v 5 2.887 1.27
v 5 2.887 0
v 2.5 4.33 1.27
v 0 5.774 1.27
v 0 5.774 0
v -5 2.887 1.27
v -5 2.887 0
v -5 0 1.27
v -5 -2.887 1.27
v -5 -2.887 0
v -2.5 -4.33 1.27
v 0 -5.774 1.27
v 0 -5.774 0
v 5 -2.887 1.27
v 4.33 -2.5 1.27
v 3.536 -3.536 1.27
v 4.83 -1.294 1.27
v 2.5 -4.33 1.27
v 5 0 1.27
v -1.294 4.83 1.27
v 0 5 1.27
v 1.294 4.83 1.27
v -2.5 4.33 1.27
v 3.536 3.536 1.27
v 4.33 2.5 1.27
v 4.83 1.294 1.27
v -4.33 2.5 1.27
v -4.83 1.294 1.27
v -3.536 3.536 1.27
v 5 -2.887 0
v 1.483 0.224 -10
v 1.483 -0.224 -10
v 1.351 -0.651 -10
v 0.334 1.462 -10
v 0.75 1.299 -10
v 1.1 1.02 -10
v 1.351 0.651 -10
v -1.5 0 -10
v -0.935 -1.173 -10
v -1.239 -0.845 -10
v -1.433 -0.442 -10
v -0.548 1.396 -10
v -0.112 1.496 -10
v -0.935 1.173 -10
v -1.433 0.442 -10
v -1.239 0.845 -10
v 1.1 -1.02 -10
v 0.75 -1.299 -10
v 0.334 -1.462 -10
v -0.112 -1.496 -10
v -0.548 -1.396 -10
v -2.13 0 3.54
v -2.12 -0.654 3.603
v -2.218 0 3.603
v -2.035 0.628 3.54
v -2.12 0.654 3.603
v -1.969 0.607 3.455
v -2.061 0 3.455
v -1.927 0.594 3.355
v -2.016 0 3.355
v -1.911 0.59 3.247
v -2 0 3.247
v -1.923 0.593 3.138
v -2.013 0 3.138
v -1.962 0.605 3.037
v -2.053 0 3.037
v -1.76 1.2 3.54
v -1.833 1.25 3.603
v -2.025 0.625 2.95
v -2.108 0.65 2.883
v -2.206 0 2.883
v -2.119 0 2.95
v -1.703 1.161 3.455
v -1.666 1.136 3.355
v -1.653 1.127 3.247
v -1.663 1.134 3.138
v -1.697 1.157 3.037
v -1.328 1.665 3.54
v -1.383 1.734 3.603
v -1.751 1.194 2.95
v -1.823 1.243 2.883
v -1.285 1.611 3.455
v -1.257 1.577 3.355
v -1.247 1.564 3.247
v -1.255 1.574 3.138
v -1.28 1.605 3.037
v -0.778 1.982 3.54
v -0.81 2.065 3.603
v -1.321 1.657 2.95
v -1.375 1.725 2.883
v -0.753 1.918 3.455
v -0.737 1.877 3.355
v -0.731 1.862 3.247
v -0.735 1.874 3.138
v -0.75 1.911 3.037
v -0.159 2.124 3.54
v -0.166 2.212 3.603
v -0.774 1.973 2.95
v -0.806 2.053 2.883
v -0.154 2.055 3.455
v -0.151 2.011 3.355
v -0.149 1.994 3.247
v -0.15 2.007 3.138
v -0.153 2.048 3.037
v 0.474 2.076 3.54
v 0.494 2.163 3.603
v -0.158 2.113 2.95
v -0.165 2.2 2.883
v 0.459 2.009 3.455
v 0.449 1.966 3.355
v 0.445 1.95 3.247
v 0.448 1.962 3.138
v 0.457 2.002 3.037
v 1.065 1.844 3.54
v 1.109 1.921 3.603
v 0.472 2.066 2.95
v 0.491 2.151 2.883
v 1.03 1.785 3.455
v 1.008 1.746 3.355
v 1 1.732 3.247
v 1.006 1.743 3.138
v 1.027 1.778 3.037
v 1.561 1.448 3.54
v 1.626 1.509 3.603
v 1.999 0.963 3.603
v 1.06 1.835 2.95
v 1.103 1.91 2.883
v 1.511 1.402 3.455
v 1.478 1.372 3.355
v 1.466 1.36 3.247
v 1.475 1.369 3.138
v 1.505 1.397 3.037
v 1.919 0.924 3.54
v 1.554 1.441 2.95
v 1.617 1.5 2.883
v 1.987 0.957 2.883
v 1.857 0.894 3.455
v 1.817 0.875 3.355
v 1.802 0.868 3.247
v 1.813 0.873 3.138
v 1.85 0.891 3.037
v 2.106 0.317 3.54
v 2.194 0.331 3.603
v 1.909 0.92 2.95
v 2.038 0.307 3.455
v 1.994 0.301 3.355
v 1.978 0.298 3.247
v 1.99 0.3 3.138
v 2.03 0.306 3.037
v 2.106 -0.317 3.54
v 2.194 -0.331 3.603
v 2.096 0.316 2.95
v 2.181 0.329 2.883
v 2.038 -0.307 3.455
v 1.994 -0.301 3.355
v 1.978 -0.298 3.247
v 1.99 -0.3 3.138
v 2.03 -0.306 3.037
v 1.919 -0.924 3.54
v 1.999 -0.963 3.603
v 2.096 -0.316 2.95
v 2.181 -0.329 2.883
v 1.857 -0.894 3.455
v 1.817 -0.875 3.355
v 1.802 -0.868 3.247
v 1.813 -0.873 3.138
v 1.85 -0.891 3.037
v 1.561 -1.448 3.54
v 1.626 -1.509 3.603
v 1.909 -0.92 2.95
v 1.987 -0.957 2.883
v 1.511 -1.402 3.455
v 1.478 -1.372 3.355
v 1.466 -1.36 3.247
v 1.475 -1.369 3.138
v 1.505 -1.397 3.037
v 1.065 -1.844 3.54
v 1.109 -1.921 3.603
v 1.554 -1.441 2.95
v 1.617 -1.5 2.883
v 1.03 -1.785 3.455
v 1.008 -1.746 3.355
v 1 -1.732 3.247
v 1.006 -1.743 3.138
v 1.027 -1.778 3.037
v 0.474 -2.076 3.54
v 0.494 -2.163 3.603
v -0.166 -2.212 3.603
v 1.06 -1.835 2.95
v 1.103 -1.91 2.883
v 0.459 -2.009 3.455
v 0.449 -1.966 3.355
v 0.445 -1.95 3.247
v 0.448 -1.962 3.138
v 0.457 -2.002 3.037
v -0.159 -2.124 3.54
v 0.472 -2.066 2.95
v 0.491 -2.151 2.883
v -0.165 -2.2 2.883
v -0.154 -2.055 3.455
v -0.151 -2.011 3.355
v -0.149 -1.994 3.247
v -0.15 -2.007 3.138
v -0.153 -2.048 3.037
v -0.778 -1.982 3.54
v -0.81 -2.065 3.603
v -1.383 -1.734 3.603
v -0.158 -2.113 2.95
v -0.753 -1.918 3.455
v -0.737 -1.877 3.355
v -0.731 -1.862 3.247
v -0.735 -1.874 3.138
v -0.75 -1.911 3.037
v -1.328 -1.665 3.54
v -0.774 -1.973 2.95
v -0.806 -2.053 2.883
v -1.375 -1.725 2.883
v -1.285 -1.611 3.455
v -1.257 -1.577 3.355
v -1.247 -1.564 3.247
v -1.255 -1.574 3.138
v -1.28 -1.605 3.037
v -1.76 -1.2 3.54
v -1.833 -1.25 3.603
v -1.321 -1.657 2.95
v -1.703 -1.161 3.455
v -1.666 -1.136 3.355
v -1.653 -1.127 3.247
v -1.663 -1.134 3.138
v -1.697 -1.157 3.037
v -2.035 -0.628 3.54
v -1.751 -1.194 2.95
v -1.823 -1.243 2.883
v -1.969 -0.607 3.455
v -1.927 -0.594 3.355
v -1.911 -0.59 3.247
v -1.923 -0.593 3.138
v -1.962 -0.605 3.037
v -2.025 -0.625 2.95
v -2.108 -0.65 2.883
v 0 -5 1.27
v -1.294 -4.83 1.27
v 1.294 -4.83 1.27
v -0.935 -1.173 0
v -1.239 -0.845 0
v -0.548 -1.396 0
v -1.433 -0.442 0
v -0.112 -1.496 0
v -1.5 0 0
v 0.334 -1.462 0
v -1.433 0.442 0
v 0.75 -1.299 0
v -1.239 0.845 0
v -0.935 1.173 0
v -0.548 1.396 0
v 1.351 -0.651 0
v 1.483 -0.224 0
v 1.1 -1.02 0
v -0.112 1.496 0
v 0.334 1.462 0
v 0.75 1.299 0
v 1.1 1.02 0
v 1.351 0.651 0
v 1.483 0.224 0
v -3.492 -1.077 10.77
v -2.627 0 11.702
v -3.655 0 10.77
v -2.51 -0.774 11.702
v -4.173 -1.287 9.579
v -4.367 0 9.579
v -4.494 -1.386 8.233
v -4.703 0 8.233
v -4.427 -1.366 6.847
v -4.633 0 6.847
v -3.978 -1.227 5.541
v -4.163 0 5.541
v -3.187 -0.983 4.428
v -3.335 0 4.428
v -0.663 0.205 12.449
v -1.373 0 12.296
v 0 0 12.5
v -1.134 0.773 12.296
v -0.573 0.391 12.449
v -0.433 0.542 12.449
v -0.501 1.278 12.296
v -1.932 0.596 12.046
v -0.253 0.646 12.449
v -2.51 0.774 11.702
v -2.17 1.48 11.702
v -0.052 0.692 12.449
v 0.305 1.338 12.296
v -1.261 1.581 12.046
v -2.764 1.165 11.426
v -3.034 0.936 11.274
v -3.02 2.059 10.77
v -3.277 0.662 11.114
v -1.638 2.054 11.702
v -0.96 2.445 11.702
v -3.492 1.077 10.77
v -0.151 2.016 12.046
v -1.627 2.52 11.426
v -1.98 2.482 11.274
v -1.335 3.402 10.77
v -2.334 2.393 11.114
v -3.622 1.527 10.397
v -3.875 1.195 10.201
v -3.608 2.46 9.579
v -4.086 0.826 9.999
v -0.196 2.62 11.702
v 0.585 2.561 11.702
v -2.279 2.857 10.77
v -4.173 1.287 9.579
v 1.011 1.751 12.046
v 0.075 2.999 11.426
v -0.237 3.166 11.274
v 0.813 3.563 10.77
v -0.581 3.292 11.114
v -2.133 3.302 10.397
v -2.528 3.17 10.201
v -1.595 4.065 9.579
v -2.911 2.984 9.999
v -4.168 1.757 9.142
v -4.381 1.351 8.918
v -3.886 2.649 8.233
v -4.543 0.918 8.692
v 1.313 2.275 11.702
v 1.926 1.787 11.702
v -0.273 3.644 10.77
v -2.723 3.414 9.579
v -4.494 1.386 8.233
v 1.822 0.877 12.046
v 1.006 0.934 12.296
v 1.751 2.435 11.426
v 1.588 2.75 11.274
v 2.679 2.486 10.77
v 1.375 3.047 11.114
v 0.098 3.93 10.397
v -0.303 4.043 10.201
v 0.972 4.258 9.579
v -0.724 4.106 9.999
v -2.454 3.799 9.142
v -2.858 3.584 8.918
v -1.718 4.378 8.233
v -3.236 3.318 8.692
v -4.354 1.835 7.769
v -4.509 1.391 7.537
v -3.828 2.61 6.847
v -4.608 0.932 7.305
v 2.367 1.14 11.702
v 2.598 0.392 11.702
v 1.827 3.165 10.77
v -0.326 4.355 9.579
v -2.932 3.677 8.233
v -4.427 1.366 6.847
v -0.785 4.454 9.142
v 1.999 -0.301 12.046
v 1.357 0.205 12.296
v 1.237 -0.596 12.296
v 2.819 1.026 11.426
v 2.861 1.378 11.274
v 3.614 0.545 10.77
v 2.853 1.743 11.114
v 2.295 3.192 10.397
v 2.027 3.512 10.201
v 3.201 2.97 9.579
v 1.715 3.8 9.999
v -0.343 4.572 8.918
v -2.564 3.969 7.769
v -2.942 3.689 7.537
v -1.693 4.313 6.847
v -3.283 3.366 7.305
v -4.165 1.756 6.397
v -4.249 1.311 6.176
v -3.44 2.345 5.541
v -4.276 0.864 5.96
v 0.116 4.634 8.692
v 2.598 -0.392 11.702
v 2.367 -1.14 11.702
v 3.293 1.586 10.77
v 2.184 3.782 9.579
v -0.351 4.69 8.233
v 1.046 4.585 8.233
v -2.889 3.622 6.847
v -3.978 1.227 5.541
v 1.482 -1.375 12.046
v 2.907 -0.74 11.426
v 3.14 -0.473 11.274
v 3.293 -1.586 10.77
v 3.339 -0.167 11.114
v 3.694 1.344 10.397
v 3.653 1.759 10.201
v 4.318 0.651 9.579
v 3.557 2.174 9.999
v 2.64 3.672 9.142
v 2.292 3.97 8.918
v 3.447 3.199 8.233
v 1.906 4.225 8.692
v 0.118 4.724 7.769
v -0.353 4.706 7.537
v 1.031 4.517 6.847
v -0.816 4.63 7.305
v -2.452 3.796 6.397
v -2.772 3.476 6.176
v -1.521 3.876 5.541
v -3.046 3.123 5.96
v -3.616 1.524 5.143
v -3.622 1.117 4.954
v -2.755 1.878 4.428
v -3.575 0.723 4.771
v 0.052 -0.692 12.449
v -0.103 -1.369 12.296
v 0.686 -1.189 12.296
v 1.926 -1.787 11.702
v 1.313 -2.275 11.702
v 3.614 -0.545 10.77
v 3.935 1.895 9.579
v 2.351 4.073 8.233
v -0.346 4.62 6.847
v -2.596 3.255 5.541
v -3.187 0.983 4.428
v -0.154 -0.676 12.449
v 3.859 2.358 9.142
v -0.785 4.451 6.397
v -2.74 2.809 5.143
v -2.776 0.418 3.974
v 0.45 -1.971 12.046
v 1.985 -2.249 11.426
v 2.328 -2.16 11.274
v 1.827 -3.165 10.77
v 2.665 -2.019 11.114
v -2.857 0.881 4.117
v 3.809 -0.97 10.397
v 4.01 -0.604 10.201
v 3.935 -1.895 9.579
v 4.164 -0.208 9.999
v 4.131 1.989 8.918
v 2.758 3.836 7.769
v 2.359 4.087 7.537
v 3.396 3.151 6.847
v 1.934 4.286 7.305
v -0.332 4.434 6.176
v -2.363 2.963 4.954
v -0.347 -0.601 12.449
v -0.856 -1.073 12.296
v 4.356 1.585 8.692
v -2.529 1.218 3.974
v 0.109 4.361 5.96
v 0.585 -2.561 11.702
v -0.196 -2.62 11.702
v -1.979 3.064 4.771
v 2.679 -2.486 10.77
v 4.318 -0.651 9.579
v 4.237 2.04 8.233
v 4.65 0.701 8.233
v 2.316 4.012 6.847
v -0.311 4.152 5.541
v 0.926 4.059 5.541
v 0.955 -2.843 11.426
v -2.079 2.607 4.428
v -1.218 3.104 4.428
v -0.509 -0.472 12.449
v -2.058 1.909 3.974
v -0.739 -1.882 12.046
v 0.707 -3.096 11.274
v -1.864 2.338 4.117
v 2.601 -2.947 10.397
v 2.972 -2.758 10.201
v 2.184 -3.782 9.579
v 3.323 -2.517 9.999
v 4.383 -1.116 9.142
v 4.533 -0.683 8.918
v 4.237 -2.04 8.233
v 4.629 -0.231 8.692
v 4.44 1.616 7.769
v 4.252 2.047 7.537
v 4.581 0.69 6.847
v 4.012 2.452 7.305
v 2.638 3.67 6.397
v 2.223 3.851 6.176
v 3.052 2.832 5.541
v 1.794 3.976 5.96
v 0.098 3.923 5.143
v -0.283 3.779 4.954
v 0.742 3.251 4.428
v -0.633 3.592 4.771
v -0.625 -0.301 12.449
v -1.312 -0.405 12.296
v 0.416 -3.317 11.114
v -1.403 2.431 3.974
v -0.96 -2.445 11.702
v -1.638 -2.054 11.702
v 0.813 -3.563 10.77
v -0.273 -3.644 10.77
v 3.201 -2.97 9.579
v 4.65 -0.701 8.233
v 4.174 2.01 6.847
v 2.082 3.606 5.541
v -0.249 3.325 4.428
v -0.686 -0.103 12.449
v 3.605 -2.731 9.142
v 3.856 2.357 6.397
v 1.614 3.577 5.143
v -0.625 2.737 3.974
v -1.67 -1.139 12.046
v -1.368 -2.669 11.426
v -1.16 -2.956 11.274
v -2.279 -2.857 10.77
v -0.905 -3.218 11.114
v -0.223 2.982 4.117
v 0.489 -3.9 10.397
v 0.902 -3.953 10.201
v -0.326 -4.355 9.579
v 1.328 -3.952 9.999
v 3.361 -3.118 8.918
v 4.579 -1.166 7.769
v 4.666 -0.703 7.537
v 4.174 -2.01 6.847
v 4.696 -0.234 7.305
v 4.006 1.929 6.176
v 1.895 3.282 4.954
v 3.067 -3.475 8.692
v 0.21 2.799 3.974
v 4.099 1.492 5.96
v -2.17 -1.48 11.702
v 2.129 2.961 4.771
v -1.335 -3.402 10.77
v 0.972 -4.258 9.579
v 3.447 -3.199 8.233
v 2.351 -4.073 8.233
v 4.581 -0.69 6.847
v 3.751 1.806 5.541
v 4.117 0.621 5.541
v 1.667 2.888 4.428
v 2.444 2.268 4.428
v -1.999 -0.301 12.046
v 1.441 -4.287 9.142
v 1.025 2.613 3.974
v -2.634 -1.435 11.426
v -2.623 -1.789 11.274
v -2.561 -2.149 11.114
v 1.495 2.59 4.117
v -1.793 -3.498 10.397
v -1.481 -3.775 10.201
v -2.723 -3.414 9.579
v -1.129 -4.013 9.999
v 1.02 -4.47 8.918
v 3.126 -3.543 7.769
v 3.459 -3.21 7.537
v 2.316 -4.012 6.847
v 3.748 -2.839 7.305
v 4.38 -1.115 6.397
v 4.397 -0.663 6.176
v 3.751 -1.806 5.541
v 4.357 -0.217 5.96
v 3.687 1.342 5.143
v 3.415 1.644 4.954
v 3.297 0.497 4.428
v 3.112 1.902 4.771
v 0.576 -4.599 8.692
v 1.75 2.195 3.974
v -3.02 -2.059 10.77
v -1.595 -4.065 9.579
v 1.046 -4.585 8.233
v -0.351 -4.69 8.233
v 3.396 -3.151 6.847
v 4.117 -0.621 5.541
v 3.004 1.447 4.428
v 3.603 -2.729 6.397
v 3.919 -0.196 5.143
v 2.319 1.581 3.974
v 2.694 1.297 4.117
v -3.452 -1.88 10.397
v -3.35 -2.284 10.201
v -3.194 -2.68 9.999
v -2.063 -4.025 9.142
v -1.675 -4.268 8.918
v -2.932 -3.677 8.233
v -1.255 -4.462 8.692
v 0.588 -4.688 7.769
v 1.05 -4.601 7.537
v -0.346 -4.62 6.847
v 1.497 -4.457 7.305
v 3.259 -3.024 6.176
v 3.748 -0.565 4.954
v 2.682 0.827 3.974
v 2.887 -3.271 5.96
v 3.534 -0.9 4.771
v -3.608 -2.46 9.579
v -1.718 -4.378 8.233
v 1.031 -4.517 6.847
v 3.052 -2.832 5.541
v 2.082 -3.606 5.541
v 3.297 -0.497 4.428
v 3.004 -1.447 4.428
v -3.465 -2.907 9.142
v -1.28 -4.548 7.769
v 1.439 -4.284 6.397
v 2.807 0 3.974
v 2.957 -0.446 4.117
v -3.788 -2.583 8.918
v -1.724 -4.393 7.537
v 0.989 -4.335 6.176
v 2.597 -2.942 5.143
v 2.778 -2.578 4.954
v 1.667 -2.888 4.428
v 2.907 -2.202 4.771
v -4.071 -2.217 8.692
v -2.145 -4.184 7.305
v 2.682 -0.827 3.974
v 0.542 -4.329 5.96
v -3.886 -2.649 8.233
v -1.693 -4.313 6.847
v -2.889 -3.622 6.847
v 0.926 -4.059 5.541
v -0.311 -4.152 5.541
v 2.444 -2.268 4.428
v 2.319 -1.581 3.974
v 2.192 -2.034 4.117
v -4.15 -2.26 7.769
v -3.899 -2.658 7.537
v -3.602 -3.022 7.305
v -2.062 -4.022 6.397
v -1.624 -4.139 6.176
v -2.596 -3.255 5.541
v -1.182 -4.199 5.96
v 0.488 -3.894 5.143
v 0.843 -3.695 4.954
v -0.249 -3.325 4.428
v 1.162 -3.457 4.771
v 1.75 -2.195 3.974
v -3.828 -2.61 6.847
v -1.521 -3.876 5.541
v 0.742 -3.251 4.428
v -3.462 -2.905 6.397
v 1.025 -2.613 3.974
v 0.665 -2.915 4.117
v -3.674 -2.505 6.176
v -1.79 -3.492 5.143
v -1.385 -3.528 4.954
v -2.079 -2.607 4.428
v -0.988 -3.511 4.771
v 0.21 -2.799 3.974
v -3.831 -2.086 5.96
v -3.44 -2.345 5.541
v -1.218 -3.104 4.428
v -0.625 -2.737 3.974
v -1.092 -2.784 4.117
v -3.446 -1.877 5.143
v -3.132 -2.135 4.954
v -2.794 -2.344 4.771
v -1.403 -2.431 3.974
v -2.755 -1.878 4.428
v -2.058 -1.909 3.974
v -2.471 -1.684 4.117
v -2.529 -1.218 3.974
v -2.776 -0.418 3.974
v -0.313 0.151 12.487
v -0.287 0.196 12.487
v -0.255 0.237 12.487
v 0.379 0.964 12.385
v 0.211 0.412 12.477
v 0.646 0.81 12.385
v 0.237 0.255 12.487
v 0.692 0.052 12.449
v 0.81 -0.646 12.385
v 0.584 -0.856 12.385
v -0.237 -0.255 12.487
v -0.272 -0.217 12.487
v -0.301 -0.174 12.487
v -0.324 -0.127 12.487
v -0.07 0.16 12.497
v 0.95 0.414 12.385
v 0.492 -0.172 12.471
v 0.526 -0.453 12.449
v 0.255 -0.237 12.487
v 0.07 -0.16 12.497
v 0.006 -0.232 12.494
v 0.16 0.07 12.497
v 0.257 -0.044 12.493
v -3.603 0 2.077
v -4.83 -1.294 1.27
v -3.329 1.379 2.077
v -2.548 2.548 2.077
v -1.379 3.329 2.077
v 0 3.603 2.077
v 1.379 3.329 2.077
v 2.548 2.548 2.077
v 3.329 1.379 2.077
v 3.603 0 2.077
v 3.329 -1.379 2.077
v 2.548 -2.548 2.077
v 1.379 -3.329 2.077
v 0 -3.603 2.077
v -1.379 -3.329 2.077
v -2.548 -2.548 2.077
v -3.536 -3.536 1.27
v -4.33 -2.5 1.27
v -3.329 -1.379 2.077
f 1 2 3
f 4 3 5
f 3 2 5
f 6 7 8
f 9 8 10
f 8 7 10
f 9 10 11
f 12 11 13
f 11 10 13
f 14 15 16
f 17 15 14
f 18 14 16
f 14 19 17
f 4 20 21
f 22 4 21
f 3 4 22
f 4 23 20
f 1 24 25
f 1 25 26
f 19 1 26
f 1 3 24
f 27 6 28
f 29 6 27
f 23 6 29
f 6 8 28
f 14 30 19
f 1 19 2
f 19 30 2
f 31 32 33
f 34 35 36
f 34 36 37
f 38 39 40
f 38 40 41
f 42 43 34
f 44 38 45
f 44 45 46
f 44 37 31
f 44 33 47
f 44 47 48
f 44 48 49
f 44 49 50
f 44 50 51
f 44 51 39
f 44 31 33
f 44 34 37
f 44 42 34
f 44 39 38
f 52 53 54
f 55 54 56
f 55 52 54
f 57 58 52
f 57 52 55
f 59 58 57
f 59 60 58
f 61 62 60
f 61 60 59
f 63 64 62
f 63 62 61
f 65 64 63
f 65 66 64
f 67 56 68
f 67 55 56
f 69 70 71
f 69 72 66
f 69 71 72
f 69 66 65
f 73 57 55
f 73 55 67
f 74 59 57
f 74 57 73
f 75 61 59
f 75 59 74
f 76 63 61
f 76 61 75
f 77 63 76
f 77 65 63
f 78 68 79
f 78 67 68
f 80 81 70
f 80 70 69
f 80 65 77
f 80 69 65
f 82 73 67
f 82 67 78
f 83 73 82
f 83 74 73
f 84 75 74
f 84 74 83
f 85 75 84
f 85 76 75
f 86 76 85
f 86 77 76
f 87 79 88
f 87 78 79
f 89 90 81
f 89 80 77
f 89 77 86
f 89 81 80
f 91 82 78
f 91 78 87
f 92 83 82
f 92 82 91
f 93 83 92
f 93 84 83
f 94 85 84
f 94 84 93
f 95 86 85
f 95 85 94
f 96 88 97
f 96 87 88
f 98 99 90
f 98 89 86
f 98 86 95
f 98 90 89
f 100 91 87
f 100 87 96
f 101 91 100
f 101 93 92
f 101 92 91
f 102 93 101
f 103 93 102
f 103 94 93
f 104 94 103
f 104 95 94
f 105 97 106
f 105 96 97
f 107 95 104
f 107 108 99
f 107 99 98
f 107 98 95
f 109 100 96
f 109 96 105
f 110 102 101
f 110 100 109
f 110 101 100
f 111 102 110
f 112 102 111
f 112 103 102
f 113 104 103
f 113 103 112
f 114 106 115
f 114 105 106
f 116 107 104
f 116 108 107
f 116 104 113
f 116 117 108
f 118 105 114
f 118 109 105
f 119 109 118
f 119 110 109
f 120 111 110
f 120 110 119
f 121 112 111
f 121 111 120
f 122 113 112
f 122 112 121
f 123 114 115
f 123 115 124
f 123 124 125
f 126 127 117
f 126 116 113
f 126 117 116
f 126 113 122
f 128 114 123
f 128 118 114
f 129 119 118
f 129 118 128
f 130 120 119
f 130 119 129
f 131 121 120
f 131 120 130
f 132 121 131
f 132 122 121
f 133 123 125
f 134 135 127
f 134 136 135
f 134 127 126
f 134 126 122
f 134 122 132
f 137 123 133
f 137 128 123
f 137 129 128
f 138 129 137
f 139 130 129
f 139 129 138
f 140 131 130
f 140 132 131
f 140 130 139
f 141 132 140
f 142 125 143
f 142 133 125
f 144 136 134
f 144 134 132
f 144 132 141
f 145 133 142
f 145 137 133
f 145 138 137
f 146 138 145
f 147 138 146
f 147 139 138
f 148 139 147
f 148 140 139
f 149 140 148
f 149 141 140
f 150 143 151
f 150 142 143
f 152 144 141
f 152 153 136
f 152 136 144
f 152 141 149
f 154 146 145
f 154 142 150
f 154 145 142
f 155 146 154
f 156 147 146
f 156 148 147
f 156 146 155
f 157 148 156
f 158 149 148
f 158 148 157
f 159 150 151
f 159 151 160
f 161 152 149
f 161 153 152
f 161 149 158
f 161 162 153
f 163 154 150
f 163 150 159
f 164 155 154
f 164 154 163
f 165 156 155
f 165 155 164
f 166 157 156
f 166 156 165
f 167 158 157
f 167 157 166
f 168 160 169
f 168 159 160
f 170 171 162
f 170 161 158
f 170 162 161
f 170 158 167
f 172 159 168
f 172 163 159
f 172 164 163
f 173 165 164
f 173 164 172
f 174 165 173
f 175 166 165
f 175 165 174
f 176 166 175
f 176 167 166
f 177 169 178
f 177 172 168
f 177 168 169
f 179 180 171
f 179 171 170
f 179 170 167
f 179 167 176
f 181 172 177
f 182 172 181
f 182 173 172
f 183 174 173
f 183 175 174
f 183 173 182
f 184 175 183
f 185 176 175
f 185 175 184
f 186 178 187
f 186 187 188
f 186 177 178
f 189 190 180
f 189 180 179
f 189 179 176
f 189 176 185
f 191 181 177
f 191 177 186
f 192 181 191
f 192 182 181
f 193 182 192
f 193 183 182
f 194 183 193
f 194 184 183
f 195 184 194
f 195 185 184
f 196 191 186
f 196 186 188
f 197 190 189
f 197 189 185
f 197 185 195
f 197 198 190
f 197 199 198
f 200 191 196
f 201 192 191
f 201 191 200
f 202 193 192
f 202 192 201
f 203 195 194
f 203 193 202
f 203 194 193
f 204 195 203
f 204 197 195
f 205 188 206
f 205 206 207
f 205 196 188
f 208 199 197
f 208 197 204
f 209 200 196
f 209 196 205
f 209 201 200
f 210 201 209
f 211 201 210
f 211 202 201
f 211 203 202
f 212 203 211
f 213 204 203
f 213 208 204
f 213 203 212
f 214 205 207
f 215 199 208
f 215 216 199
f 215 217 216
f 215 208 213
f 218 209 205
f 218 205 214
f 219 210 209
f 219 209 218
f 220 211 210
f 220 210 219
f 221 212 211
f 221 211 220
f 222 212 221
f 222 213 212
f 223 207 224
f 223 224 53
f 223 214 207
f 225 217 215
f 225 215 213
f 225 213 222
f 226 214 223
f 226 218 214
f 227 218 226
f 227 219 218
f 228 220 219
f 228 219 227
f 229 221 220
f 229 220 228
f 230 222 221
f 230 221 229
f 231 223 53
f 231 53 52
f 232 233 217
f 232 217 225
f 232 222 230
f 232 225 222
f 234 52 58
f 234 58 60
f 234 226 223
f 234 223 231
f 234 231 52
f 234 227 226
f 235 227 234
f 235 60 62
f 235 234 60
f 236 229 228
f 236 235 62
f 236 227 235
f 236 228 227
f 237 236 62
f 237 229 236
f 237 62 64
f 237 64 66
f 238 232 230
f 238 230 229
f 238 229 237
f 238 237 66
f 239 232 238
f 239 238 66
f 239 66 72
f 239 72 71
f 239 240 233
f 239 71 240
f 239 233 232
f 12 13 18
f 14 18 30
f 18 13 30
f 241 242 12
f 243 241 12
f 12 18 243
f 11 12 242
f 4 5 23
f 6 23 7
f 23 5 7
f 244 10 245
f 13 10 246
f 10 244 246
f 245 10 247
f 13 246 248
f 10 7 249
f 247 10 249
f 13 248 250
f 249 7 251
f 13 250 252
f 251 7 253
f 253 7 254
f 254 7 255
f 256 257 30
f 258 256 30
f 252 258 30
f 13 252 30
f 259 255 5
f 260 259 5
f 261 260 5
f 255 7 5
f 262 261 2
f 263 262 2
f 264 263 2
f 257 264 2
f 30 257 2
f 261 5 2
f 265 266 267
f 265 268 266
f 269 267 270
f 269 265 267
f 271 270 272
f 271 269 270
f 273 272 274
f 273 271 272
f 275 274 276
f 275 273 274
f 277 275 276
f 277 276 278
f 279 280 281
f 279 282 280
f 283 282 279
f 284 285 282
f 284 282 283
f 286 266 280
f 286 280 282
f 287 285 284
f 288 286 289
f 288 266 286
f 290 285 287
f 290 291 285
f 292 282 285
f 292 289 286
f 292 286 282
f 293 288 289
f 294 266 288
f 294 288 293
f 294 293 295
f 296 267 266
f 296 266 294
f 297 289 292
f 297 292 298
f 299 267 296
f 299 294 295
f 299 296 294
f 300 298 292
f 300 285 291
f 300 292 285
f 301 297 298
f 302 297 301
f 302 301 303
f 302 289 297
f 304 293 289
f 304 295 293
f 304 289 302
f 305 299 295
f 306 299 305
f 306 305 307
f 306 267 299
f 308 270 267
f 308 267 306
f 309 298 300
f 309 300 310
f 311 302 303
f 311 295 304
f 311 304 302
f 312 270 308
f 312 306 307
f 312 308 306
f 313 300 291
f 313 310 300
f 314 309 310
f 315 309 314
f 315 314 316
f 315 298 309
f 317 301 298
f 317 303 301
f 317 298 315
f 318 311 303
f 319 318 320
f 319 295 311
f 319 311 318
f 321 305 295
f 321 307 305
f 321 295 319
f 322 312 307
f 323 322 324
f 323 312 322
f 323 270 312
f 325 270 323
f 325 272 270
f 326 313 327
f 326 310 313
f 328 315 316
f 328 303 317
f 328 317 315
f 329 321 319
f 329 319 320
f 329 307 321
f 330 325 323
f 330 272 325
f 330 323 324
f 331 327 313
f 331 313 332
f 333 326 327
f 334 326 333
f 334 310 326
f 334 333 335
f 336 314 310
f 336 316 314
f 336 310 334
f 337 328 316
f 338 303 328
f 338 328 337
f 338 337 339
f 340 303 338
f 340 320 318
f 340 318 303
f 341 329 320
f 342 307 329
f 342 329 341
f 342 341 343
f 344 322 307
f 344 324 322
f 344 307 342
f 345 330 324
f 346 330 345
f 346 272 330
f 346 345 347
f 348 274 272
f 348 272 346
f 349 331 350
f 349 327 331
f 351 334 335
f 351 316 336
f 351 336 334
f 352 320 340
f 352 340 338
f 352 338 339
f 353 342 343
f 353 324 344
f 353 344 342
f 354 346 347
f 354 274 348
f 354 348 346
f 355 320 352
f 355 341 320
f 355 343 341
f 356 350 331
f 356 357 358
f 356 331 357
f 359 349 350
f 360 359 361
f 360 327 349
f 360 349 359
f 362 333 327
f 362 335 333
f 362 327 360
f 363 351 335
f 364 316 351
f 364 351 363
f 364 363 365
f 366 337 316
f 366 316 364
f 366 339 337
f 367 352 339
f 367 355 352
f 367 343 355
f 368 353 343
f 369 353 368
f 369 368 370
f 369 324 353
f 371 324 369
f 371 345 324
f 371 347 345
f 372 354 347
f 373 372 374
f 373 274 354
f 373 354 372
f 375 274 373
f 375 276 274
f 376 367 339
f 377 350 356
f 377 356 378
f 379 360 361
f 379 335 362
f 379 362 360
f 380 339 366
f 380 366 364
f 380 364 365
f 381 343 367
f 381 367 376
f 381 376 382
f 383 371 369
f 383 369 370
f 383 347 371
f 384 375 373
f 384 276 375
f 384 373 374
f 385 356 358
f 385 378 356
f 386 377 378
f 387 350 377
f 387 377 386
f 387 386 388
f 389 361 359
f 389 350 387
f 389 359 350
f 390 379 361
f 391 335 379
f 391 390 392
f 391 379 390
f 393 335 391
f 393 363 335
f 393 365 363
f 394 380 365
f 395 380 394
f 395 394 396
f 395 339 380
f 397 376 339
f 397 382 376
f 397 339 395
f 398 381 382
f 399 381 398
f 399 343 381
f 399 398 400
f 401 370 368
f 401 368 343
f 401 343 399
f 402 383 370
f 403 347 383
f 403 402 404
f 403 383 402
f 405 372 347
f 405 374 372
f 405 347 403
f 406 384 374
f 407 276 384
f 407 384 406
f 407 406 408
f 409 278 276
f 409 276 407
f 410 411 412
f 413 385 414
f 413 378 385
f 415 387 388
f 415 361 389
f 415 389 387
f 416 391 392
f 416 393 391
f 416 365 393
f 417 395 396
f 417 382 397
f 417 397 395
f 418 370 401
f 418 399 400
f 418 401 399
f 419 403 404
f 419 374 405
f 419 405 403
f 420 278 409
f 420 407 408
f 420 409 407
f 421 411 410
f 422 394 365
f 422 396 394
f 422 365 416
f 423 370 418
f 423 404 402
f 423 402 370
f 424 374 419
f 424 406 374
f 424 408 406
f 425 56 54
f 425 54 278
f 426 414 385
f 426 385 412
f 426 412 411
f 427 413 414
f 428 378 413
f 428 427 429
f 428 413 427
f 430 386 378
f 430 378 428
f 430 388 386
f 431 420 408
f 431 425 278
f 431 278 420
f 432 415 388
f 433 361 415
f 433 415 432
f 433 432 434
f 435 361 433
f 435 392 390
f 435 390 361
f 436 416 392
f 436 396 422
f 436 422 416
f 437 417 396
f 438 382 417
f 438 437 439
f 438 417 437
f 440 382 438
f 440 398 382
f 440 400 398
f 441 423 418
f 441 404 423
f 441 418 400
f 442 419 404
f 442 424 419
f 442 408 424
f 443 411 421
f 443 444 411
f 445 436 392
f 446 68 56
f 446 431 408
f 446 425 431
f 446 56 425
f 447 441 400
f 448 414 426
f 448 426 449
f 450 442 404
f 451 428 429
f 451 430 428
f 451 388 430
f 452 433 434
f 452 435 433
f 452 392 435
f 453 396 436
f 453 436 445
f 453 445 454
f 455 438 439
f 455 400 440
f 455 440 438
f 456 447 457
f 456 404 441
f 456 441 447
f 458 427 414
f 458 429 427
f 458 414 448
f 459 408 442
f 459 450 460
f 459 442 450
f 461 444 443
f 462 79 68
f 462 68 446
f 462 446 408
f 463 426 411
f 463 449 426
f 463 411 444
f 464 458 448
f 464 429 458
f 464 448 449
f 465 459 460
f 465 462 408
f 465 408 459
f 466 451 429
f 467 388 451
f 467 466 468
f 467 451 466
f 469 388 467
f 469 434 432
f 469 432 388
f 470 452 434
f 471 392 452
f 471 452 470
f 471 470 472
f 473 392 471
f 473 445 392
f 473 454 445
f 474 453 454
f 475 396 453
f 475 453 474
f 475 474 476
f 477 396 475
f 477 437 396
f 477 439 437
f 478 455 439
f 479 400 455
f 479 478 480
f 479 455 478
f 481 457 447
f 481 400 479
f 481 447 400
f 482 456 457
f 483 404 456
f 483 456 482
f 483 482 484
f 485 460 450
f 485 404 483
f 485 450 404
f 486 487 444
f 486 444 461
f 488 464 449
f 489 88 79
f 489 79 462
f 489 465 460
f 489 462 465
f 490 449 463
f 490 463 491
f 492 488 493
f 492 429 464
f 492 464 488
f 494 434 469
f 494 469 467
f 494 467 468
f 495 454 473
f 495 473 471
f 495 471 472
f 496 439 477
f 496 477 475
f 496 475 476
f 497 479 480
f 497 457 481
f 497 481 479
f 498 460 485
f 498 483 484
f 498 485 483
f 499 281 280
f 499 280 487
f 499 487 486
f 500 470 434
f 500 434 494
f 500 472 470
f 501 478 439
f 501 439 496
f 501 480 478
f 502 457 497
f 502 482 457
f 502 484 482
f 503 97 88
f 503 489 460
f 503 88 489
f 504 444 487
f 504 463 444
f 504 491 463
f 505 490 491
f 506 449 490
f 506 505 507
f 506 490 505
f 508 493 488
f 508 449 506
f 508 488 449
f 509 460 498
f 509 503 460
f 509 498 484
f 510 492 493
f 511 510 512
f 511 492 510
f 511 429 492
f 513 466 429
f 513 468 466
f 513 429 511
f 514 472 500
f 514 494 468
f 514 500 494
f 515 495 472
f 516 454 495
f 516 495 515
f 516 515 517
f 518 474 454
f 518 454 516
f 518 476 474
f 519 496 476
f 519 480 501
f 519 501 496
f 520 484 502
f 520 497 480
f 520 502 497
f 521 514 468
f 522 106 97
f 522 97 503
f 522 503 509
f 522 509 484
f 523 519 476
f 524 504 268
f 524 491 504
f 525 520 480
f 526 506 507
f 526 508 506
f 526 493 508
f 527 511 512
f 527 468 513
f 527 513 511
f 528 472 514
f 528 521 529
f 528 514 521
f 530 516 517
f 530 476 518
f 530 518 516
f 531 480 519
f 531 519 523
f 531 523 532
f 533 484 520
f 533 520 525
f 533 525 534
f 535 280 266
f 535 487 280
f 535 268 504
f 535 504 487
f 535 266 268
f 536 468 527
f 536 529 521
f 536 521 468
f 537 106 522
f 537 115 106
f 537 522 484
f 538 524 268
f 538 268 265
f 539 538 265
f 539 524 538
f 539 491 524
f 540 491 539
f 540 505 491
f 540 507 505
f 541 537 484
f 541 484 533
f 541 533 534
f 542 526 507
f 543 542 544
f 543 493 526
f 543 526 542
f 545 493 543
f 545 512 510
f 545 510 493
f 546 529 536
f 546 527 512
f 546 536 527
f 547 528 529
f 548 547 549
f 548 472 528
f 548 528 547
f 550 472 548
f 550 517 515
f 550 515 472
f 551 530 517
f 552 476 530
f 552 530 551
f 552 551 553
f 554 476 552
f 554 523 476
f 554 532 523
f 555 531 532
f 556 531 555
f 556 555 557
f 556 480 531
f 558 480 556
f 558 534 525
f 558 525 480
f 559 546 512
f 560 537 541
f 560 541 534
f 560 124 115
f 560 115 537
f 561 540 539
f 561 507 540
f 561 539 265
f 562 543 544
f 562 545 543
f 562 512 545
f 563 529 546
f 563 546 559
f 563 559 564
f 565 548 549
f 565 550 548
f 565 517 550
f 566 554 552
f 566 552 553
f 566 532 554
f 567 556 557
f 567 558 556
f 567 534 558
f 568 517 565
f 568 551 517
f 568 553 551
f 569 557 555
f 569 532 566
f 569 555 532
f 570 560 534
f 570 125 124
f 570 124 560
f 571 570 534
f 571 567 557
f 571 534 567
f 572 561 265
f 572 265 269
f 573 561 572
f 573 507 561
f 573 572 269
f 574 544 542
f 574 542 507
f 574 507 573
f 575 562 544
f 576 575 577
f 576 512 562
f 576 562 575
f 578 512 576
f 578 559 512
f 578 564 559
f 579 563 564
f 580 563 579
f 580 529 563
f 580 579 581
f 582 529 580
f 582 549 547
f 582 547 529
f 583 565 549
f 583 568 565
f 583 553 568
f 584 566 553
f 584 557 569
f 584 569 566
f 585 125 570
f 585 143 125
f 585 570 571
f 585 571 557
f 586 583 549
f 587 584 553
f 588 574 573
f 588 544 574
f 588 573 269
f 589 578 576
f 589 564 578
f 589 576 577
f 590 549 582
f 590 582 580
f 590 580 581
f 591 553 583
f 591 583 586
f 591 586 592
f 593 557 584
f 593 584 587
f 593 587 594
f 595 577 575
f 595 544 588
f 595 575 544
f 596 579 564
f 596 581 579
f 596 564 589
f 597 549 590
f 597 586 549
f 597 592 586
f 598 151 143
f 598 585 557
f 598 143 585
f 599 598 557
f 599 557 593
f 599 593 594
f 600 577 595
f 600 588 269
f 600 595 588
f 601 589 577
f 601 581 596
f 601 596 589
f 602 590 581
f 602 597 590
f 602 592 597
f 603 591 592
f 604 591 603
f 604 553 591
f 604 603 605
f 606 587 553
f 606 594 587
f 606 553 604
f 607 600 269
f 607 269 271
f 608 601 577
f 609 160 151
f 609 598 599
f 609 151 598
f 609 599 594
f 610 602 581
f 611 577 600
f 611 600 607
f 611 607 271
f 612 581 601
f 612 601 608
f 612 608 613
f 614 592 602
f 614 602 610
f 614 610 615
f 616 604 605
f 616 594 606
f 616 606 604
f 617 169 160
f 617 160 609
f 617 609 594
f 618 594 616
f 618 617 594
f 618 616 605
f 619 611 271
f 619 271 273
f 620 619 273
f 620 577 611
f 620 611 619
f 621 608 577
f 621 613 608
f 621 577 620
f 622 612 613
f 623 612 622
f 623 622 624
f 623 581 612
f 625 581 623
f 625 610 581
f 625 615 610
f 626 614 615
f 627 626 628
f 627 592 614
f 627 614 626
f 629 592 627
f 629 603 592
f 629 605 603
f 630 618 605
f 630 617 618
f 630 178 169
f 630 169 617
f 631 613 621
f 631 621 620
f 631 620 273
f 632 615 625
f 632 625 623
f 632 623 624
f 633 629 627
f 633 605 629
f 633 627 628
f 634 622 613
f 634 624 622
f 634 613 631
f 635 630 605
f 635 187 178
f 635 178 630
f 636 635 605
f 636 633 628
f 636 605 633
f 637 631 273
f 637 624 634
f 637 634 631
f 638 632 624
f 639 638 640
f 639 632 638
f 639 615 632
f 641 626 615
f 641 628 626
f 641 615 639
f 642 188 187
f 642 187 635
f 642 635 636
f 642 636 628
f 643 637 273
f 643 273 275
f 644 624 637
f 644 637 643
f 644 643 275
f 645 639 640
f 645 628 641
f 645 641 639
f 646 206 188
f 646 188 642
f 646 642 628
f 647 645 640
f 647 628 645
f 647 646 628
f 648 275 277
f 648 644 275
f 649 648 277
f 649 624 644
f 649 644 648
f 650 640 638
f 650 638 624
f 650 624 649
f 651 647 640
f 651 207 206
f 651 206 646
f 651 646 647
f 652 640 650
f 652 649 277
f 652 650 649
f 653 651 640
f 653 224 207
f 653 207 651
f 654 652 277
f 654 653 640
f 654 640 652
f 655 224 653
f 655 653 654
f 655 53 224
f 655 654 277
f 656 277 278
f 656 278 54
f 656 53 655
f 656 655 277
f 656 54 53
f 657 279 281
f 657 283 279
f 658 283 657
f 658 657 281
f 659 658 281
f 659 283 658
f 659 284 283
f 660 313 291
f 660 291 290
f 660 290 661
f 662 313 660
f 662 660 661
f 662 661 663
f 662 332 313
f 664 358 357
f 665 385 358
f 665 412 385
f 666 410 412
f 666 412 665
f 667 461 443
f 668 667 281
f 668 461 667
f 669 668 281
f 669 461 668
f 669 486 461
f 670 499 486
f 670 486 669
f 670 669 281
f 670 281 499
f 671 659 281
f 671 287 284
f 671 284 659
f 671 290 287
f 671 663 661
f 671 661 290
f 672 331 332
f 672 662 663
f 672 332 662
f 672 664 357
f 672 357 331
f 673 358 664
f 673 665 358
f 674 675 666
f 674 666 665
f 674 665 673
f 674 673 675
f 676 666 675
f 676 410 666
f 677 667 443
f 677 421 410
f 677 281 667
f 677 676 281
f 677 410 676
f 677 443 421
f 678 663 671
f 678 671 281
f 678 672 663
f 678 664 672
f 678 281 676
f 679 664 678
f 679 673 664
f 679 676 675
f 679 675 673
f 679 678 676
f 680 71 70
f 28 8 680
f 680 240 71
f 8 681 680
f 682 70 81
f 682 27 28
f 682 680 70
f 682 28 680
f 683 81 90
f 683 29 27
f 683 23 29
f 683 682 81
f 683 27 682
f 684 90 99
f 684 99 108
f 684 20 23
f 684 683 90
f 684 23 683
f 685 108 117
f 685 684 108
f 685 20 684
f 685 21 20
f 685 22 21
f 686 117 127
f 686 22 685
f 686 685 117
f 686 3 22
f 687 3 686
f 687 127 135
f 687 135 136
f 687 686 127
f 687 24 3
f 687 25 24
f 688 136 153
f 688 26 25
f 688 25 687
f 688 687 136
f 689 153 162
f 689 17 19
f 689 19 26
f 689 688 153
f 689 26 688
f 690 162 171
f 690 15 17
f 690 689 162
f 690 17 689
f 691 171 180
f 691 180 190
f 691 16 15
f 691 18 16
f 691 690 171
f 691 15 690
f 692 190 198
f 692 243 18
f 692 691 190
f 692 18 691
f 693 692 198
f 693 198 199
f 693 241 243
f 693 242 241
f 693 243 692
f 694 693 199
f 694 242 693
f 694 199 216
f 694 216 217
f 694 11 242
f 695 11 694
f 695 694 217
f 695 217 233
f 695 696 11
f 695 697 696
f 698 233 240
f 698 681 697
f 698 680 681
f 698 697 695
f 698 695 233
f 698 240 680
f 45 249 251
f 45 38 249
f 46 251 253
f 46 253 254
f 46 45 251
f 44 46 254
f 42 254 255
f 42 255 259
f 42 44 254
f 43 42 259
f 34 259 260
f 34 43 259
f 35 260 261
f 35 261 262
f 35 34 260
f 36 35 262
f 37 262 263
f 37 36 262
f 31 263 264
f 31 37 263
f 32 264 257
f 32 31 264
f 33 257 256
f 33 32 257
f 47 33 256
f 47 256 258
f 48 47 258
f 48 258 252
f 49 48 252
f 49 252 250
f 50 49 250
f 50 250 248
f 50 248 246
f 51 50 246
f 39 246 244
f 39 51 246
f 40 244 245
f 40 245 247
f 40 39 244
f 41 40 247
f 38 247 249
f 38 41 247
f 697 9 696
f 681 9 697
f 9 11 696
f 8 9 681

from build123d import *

# Parameters (mm, degrees)
F3_DEPTH = 1.27


with BuildPart() as f1:
    # F0 (on Front) → F1 (revolve)
    with BuildSketch(Plane.XZ):
        with BuildLine():
            Line((0, 0), (0, 12.5))
            ThreePointArc((0, 12.5), (-4.584632, 8.918143), (-2.218366, 3.603133))
            ThreePointArc((-2.218366, 3.603133), (-2.000063, 3.246878), (-2.20581, 2.883226))
            Line((-2.20581, 2.883226), (-5, 1.27))
            Line((-5, 1.27), (-5, 0))
            Line((-5, 0), (-1.5, 0))
            Line((-1.5, 0), (-1.5, -10))
            Line((-1.5, -10), (0, -10))
            Line((0, -10), (0, 0))
        make_face()
    revolve(axis=Axis((0, 0, 0.226223), (0, 0, -1)))

    # F2 (on Top) → F3 (join)
    with BuildSketch(Plane.XY):
        Polygon((5, -2.886751), (5, 2.886751), (0, 5.773503), (-5, 2.886751), (-5, -2.886751), (0, -5.773503), align=None)
    extrude(amount=F3_DEPTH)


solid = f1.part
